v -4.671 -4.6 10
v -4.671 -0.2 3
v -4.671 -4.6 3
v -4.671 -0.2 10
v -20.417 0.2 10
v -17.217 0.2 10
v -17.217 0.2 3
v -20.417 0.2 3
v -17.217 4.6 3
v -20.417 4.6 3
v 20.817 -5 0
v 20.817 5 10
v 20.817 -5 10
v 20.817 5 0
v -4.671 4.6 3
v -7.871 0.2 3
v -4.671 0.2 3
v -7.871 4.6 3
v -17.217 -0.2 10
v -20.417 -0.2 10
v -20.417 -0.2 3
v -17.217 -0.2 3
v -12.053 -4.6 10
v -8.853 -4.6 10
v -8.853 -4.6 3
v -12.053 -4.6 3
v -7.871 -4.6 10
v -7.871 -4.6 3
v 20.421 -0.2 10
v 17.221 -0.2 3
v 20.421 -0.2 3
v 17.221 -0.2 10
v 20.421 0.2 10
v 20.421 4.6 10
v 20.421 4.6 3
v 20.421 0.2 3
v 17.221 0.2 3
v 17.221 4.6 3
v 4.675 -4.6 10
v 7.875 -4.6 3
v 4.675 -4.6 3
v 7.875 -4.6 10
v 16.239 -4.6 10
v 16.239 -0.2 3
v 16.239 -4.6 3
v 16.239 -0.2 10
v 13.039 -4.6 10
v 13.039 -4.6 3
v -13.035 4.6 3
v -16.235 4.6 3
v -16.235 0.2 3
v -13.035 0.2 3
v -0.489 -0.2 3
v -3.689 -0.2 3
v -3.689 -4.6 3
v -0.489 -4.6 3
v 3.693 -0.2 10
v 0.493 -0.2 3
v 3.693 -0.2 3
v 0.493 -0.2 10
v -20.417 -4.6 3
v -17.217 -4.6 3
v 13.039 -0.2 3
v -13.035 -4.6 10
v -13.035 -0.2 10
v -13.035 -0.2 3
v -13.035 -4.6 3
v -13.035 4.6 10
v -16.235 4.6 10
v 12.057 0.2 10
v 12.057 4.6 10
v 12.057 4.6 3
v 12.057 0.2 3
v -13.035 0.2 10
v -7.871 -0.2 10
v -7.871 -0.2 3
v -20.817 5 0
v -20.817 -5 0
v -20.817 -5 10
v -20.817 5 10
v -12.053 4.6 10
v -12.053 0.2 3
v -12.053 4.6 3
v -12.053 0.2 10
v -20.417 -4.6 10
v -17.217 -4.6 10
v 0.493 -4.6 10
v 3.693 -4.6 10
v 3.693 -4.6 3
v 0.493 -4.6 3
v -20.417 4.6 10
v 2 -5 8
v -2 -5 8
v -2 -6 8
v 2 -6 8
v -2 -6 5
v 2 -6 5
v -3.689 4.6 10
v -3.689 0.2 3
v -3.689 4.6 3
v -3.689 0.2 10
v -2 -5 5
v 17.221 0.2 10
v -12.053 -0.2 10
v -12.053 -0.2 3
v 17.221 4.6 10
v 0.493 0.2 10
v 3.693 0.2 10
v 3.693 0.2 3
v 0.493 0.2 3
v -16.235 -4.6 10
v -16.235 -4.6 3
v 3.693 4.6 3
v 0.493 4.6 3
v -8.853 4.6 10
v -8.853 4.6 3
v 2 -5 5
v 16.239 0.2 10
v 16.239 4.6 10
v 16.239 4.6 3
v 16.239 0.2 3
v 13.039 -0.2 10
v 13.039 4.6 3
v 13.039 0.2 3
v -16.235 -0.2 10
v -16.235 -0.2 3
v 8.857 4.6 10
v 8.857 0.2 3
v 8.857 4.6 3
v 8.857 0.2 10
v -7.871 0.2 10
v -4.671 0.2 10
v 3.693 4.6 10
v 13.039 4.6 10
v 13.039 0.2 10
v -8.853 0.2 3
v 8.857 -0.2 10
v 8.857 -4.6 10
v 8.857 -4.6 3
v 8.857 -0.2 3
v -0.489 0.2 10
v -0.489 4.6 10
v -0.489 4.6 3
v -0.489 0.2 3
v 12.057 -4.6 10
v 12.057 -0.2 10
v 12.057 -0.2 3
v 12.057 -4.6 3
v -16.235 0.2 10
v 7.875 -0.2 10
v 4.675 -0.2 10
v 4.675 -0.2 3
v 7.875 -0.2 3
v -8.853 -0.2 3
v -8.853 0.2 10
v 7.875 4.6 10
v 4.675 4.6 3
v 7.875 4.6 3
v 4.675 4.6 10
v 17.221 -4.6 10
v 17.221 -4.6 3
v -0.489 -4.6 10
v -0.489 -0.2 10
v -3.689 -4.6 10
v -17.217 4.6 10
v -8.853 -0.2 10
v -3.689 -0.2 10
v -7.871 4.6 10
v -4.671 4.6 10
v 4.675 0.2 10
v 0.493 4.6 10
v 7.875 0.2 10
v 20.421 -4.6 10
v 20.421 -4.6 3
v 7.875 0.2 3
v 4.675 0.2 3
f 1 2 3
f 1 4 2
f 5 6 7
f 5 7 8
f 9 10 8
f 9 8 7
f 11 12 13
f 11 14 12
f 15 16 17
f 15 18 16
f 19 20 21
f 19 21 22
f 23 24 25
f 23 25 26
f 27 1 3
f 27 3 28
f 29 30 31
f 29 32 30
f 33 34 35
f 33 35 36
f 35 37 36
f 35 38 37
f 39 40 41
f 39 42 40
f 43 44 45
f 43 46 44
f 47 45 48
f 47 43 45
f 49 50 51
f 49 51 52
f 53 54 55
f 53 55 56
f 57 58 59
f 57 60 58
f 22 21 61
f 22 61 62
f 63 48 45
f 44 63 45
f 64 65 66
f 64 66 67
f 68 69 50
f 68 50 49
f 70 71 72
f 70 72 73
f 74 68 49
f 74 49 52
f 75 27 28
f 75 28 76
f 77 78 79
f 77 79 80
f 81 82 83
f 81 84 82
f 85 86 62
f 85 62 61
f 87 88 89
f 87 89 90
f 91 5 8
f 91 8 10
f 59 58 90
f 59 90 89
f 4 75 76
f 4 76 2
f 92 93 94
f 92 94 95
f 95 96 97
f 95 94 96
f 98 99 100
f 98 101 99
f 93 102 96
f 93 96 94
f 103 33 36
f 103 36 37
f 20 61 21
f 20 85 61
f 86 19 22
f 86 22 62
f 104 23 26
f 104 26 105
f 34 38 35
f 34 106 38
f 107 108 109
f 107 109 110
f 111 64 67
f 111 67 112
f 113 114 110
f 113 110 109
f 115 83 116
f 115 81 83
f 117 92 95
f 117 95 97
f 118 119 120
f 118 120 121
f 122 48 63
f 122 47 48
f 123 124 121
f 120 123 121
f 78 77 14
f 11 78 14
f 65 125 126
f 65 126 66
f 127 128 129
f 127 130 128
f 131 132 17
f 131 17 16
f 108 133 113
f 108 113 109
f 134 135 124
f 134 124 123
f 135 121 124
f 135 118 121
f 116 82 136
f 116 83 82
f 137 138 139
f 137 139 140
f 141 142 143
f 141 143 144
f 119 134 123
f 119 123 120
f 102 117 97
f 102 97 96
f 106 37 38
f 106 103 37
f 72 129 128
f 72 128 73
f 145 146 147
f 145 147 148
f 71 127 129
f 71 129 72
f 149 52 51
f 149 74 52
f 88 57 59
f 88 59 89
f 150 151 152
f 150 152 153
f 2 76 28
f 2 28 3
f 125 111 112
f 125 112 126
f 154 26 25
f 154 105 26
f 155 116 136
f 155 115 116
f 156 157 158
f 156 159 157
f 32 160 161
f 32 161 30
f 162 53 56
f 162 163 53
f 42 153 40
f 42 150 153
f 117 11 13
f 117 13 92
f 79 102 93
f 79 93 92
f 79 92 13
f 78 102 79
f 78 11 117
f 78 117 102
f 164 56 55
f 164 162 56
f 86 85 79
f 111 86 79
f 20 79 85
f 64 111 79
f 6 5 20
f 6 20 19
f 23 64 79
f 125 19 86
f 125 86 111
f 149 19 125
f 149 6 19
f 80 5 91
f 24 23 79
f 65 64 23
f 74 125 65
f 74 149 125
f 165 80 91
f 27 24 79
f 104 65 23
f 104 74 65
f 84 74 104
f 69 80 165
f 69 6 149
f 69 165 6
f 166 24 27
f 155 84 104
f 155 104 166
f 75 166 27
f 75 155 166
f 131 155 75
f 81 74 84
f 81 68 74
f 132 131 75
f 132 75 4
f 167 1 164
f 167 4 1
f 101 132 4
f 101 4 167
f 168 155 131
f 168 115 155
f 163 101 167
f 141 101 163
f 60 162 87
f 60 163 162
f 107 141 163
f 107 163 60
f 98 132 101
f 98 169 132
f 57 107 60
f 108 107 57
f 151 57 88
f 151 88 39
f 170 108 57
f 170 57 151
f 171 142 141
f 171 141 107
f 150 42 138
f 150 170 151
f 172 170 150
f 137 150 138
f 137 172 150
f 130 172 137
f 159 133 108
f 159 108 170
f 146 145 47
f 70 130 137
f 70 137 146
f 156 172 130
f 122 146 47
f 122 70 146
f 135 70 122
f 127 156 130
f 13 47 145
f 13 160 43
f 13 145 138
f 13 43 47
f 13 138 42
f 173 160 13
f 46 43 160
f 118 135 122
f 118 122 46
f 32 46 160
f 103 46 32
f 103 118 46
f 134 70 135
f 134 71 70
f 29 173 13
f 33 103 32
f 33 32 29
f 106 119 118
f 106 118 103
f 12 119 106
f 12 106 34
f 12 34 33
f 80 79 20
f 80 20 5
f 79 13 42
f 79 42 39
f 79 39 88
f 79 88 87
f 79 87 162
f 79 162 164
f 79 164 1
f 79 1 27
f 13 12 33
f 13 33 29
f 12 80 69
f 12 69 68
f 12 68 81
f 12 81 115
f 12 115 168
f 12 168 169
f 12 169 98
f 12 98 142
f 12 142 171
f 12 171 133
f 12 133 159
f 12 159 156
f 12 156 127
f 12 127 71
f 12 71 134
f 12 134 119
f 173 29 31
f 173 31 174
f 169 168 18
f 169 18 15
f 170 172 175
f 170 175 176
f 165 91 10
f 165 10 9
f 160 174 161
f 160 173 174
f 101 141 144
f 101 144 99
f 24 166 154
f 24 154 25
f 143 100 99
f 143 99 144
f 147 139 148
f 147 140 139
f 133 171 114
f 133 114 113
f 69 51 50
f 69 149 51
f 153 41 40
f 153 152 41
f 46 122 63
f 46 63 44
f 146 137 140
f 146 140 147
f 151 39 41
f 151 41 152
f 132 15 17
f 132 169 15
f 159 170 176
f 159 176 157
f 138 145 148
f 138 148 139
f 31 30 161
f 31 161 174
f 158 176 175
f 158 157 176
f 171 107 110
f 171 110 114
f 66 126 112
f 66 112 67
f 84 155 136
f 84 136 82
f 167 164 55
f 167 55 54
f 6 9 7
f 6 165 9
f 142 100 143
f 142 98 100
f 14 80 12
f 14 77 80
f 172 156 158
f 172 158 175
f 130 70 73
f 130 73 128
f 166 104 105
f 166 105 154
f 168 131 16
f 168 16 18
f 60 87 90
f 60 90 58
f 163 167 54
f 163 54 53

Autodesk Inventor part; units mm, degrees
ref_plane "YZ Plane" through (0, 0, 0) normal (1, 0, 0) x (0, 1, 0)
ref_plane "XZ Plane" through (0, 0, 0) normal (0, 1, 0) x (-1, 0, 0)
sketch "Sketch1" plane through (0, 0, 0) normal (0, 0, 1) x (1, 0, 0)
  line L0 (0, 8) -> (0, -6) projected
  line L1 (-24.9804, 0) -> (33.3072, 0) projected
  line L2 (-20.817, 5) -> (20.817, 5)
  line L3 (20.817, 5) -> (20.817, -5)
  line L4 (20.817, -5) -> (-20.817, -5)
  line L5 (-20.817, -5) -> (-20.817, 5)
  dimension "d0" = 41.634
  dimension "d1" = 10
extrude "Extrusion1" add sketch "Sketch1" along normal blind 10
sketch "Sketch5" plane through (-20.817, -5, 0) normal (0, -1, 0) x (1, 0, 0)
  line L0 (41.634, 10) -> (0, 10)
  line L1 (18.817, 8) -> (22.817, 8)
  line L2 (22.817, 8) -> (22.817, 5)
  line L3 (22.817, 5) -> (18.817, 5)
  line L4 (18.817, 5) -> (18.817, 8)
  point P0 (20.817, 8)
  point P1 (20.817, 10)
  dimension "d20" = 4
  dimension "d21" = 3
  dimension "d22" = 2
extrude "Extrusion5" add sketch "Sketch5" along normal blind 1
ref_plane "Work Plane1" through (0, 0, 10) normal (0, 0, 1) x (1, 0, 0)
sketch "Sketch11" plane through (0, 0, 10) normal (0, 0, 1) x (1, 0, 0)
  line L0 (-17.217, -4.6) -> (-20.417, -4.6)
  line L1 (-20.417, -4.6) -> (-20.417, -0.2)
  line L2 (-20.417, -0.2) -> (-17.217, -0.2)
  line L3 (-17.217, -0.2) -> (-17.217, -4.6)
extrude "Extrusion11" cut sketch "Sketch11" against normal blind 7
pattern_linear "Rectangular Pattern3" count 10 spacing 4.182 along (1, 0, 0) count 2 spacing 4.8 along (0, 1, 0) of "Extrusion11"
properties part number "Power Supply Header 1"
